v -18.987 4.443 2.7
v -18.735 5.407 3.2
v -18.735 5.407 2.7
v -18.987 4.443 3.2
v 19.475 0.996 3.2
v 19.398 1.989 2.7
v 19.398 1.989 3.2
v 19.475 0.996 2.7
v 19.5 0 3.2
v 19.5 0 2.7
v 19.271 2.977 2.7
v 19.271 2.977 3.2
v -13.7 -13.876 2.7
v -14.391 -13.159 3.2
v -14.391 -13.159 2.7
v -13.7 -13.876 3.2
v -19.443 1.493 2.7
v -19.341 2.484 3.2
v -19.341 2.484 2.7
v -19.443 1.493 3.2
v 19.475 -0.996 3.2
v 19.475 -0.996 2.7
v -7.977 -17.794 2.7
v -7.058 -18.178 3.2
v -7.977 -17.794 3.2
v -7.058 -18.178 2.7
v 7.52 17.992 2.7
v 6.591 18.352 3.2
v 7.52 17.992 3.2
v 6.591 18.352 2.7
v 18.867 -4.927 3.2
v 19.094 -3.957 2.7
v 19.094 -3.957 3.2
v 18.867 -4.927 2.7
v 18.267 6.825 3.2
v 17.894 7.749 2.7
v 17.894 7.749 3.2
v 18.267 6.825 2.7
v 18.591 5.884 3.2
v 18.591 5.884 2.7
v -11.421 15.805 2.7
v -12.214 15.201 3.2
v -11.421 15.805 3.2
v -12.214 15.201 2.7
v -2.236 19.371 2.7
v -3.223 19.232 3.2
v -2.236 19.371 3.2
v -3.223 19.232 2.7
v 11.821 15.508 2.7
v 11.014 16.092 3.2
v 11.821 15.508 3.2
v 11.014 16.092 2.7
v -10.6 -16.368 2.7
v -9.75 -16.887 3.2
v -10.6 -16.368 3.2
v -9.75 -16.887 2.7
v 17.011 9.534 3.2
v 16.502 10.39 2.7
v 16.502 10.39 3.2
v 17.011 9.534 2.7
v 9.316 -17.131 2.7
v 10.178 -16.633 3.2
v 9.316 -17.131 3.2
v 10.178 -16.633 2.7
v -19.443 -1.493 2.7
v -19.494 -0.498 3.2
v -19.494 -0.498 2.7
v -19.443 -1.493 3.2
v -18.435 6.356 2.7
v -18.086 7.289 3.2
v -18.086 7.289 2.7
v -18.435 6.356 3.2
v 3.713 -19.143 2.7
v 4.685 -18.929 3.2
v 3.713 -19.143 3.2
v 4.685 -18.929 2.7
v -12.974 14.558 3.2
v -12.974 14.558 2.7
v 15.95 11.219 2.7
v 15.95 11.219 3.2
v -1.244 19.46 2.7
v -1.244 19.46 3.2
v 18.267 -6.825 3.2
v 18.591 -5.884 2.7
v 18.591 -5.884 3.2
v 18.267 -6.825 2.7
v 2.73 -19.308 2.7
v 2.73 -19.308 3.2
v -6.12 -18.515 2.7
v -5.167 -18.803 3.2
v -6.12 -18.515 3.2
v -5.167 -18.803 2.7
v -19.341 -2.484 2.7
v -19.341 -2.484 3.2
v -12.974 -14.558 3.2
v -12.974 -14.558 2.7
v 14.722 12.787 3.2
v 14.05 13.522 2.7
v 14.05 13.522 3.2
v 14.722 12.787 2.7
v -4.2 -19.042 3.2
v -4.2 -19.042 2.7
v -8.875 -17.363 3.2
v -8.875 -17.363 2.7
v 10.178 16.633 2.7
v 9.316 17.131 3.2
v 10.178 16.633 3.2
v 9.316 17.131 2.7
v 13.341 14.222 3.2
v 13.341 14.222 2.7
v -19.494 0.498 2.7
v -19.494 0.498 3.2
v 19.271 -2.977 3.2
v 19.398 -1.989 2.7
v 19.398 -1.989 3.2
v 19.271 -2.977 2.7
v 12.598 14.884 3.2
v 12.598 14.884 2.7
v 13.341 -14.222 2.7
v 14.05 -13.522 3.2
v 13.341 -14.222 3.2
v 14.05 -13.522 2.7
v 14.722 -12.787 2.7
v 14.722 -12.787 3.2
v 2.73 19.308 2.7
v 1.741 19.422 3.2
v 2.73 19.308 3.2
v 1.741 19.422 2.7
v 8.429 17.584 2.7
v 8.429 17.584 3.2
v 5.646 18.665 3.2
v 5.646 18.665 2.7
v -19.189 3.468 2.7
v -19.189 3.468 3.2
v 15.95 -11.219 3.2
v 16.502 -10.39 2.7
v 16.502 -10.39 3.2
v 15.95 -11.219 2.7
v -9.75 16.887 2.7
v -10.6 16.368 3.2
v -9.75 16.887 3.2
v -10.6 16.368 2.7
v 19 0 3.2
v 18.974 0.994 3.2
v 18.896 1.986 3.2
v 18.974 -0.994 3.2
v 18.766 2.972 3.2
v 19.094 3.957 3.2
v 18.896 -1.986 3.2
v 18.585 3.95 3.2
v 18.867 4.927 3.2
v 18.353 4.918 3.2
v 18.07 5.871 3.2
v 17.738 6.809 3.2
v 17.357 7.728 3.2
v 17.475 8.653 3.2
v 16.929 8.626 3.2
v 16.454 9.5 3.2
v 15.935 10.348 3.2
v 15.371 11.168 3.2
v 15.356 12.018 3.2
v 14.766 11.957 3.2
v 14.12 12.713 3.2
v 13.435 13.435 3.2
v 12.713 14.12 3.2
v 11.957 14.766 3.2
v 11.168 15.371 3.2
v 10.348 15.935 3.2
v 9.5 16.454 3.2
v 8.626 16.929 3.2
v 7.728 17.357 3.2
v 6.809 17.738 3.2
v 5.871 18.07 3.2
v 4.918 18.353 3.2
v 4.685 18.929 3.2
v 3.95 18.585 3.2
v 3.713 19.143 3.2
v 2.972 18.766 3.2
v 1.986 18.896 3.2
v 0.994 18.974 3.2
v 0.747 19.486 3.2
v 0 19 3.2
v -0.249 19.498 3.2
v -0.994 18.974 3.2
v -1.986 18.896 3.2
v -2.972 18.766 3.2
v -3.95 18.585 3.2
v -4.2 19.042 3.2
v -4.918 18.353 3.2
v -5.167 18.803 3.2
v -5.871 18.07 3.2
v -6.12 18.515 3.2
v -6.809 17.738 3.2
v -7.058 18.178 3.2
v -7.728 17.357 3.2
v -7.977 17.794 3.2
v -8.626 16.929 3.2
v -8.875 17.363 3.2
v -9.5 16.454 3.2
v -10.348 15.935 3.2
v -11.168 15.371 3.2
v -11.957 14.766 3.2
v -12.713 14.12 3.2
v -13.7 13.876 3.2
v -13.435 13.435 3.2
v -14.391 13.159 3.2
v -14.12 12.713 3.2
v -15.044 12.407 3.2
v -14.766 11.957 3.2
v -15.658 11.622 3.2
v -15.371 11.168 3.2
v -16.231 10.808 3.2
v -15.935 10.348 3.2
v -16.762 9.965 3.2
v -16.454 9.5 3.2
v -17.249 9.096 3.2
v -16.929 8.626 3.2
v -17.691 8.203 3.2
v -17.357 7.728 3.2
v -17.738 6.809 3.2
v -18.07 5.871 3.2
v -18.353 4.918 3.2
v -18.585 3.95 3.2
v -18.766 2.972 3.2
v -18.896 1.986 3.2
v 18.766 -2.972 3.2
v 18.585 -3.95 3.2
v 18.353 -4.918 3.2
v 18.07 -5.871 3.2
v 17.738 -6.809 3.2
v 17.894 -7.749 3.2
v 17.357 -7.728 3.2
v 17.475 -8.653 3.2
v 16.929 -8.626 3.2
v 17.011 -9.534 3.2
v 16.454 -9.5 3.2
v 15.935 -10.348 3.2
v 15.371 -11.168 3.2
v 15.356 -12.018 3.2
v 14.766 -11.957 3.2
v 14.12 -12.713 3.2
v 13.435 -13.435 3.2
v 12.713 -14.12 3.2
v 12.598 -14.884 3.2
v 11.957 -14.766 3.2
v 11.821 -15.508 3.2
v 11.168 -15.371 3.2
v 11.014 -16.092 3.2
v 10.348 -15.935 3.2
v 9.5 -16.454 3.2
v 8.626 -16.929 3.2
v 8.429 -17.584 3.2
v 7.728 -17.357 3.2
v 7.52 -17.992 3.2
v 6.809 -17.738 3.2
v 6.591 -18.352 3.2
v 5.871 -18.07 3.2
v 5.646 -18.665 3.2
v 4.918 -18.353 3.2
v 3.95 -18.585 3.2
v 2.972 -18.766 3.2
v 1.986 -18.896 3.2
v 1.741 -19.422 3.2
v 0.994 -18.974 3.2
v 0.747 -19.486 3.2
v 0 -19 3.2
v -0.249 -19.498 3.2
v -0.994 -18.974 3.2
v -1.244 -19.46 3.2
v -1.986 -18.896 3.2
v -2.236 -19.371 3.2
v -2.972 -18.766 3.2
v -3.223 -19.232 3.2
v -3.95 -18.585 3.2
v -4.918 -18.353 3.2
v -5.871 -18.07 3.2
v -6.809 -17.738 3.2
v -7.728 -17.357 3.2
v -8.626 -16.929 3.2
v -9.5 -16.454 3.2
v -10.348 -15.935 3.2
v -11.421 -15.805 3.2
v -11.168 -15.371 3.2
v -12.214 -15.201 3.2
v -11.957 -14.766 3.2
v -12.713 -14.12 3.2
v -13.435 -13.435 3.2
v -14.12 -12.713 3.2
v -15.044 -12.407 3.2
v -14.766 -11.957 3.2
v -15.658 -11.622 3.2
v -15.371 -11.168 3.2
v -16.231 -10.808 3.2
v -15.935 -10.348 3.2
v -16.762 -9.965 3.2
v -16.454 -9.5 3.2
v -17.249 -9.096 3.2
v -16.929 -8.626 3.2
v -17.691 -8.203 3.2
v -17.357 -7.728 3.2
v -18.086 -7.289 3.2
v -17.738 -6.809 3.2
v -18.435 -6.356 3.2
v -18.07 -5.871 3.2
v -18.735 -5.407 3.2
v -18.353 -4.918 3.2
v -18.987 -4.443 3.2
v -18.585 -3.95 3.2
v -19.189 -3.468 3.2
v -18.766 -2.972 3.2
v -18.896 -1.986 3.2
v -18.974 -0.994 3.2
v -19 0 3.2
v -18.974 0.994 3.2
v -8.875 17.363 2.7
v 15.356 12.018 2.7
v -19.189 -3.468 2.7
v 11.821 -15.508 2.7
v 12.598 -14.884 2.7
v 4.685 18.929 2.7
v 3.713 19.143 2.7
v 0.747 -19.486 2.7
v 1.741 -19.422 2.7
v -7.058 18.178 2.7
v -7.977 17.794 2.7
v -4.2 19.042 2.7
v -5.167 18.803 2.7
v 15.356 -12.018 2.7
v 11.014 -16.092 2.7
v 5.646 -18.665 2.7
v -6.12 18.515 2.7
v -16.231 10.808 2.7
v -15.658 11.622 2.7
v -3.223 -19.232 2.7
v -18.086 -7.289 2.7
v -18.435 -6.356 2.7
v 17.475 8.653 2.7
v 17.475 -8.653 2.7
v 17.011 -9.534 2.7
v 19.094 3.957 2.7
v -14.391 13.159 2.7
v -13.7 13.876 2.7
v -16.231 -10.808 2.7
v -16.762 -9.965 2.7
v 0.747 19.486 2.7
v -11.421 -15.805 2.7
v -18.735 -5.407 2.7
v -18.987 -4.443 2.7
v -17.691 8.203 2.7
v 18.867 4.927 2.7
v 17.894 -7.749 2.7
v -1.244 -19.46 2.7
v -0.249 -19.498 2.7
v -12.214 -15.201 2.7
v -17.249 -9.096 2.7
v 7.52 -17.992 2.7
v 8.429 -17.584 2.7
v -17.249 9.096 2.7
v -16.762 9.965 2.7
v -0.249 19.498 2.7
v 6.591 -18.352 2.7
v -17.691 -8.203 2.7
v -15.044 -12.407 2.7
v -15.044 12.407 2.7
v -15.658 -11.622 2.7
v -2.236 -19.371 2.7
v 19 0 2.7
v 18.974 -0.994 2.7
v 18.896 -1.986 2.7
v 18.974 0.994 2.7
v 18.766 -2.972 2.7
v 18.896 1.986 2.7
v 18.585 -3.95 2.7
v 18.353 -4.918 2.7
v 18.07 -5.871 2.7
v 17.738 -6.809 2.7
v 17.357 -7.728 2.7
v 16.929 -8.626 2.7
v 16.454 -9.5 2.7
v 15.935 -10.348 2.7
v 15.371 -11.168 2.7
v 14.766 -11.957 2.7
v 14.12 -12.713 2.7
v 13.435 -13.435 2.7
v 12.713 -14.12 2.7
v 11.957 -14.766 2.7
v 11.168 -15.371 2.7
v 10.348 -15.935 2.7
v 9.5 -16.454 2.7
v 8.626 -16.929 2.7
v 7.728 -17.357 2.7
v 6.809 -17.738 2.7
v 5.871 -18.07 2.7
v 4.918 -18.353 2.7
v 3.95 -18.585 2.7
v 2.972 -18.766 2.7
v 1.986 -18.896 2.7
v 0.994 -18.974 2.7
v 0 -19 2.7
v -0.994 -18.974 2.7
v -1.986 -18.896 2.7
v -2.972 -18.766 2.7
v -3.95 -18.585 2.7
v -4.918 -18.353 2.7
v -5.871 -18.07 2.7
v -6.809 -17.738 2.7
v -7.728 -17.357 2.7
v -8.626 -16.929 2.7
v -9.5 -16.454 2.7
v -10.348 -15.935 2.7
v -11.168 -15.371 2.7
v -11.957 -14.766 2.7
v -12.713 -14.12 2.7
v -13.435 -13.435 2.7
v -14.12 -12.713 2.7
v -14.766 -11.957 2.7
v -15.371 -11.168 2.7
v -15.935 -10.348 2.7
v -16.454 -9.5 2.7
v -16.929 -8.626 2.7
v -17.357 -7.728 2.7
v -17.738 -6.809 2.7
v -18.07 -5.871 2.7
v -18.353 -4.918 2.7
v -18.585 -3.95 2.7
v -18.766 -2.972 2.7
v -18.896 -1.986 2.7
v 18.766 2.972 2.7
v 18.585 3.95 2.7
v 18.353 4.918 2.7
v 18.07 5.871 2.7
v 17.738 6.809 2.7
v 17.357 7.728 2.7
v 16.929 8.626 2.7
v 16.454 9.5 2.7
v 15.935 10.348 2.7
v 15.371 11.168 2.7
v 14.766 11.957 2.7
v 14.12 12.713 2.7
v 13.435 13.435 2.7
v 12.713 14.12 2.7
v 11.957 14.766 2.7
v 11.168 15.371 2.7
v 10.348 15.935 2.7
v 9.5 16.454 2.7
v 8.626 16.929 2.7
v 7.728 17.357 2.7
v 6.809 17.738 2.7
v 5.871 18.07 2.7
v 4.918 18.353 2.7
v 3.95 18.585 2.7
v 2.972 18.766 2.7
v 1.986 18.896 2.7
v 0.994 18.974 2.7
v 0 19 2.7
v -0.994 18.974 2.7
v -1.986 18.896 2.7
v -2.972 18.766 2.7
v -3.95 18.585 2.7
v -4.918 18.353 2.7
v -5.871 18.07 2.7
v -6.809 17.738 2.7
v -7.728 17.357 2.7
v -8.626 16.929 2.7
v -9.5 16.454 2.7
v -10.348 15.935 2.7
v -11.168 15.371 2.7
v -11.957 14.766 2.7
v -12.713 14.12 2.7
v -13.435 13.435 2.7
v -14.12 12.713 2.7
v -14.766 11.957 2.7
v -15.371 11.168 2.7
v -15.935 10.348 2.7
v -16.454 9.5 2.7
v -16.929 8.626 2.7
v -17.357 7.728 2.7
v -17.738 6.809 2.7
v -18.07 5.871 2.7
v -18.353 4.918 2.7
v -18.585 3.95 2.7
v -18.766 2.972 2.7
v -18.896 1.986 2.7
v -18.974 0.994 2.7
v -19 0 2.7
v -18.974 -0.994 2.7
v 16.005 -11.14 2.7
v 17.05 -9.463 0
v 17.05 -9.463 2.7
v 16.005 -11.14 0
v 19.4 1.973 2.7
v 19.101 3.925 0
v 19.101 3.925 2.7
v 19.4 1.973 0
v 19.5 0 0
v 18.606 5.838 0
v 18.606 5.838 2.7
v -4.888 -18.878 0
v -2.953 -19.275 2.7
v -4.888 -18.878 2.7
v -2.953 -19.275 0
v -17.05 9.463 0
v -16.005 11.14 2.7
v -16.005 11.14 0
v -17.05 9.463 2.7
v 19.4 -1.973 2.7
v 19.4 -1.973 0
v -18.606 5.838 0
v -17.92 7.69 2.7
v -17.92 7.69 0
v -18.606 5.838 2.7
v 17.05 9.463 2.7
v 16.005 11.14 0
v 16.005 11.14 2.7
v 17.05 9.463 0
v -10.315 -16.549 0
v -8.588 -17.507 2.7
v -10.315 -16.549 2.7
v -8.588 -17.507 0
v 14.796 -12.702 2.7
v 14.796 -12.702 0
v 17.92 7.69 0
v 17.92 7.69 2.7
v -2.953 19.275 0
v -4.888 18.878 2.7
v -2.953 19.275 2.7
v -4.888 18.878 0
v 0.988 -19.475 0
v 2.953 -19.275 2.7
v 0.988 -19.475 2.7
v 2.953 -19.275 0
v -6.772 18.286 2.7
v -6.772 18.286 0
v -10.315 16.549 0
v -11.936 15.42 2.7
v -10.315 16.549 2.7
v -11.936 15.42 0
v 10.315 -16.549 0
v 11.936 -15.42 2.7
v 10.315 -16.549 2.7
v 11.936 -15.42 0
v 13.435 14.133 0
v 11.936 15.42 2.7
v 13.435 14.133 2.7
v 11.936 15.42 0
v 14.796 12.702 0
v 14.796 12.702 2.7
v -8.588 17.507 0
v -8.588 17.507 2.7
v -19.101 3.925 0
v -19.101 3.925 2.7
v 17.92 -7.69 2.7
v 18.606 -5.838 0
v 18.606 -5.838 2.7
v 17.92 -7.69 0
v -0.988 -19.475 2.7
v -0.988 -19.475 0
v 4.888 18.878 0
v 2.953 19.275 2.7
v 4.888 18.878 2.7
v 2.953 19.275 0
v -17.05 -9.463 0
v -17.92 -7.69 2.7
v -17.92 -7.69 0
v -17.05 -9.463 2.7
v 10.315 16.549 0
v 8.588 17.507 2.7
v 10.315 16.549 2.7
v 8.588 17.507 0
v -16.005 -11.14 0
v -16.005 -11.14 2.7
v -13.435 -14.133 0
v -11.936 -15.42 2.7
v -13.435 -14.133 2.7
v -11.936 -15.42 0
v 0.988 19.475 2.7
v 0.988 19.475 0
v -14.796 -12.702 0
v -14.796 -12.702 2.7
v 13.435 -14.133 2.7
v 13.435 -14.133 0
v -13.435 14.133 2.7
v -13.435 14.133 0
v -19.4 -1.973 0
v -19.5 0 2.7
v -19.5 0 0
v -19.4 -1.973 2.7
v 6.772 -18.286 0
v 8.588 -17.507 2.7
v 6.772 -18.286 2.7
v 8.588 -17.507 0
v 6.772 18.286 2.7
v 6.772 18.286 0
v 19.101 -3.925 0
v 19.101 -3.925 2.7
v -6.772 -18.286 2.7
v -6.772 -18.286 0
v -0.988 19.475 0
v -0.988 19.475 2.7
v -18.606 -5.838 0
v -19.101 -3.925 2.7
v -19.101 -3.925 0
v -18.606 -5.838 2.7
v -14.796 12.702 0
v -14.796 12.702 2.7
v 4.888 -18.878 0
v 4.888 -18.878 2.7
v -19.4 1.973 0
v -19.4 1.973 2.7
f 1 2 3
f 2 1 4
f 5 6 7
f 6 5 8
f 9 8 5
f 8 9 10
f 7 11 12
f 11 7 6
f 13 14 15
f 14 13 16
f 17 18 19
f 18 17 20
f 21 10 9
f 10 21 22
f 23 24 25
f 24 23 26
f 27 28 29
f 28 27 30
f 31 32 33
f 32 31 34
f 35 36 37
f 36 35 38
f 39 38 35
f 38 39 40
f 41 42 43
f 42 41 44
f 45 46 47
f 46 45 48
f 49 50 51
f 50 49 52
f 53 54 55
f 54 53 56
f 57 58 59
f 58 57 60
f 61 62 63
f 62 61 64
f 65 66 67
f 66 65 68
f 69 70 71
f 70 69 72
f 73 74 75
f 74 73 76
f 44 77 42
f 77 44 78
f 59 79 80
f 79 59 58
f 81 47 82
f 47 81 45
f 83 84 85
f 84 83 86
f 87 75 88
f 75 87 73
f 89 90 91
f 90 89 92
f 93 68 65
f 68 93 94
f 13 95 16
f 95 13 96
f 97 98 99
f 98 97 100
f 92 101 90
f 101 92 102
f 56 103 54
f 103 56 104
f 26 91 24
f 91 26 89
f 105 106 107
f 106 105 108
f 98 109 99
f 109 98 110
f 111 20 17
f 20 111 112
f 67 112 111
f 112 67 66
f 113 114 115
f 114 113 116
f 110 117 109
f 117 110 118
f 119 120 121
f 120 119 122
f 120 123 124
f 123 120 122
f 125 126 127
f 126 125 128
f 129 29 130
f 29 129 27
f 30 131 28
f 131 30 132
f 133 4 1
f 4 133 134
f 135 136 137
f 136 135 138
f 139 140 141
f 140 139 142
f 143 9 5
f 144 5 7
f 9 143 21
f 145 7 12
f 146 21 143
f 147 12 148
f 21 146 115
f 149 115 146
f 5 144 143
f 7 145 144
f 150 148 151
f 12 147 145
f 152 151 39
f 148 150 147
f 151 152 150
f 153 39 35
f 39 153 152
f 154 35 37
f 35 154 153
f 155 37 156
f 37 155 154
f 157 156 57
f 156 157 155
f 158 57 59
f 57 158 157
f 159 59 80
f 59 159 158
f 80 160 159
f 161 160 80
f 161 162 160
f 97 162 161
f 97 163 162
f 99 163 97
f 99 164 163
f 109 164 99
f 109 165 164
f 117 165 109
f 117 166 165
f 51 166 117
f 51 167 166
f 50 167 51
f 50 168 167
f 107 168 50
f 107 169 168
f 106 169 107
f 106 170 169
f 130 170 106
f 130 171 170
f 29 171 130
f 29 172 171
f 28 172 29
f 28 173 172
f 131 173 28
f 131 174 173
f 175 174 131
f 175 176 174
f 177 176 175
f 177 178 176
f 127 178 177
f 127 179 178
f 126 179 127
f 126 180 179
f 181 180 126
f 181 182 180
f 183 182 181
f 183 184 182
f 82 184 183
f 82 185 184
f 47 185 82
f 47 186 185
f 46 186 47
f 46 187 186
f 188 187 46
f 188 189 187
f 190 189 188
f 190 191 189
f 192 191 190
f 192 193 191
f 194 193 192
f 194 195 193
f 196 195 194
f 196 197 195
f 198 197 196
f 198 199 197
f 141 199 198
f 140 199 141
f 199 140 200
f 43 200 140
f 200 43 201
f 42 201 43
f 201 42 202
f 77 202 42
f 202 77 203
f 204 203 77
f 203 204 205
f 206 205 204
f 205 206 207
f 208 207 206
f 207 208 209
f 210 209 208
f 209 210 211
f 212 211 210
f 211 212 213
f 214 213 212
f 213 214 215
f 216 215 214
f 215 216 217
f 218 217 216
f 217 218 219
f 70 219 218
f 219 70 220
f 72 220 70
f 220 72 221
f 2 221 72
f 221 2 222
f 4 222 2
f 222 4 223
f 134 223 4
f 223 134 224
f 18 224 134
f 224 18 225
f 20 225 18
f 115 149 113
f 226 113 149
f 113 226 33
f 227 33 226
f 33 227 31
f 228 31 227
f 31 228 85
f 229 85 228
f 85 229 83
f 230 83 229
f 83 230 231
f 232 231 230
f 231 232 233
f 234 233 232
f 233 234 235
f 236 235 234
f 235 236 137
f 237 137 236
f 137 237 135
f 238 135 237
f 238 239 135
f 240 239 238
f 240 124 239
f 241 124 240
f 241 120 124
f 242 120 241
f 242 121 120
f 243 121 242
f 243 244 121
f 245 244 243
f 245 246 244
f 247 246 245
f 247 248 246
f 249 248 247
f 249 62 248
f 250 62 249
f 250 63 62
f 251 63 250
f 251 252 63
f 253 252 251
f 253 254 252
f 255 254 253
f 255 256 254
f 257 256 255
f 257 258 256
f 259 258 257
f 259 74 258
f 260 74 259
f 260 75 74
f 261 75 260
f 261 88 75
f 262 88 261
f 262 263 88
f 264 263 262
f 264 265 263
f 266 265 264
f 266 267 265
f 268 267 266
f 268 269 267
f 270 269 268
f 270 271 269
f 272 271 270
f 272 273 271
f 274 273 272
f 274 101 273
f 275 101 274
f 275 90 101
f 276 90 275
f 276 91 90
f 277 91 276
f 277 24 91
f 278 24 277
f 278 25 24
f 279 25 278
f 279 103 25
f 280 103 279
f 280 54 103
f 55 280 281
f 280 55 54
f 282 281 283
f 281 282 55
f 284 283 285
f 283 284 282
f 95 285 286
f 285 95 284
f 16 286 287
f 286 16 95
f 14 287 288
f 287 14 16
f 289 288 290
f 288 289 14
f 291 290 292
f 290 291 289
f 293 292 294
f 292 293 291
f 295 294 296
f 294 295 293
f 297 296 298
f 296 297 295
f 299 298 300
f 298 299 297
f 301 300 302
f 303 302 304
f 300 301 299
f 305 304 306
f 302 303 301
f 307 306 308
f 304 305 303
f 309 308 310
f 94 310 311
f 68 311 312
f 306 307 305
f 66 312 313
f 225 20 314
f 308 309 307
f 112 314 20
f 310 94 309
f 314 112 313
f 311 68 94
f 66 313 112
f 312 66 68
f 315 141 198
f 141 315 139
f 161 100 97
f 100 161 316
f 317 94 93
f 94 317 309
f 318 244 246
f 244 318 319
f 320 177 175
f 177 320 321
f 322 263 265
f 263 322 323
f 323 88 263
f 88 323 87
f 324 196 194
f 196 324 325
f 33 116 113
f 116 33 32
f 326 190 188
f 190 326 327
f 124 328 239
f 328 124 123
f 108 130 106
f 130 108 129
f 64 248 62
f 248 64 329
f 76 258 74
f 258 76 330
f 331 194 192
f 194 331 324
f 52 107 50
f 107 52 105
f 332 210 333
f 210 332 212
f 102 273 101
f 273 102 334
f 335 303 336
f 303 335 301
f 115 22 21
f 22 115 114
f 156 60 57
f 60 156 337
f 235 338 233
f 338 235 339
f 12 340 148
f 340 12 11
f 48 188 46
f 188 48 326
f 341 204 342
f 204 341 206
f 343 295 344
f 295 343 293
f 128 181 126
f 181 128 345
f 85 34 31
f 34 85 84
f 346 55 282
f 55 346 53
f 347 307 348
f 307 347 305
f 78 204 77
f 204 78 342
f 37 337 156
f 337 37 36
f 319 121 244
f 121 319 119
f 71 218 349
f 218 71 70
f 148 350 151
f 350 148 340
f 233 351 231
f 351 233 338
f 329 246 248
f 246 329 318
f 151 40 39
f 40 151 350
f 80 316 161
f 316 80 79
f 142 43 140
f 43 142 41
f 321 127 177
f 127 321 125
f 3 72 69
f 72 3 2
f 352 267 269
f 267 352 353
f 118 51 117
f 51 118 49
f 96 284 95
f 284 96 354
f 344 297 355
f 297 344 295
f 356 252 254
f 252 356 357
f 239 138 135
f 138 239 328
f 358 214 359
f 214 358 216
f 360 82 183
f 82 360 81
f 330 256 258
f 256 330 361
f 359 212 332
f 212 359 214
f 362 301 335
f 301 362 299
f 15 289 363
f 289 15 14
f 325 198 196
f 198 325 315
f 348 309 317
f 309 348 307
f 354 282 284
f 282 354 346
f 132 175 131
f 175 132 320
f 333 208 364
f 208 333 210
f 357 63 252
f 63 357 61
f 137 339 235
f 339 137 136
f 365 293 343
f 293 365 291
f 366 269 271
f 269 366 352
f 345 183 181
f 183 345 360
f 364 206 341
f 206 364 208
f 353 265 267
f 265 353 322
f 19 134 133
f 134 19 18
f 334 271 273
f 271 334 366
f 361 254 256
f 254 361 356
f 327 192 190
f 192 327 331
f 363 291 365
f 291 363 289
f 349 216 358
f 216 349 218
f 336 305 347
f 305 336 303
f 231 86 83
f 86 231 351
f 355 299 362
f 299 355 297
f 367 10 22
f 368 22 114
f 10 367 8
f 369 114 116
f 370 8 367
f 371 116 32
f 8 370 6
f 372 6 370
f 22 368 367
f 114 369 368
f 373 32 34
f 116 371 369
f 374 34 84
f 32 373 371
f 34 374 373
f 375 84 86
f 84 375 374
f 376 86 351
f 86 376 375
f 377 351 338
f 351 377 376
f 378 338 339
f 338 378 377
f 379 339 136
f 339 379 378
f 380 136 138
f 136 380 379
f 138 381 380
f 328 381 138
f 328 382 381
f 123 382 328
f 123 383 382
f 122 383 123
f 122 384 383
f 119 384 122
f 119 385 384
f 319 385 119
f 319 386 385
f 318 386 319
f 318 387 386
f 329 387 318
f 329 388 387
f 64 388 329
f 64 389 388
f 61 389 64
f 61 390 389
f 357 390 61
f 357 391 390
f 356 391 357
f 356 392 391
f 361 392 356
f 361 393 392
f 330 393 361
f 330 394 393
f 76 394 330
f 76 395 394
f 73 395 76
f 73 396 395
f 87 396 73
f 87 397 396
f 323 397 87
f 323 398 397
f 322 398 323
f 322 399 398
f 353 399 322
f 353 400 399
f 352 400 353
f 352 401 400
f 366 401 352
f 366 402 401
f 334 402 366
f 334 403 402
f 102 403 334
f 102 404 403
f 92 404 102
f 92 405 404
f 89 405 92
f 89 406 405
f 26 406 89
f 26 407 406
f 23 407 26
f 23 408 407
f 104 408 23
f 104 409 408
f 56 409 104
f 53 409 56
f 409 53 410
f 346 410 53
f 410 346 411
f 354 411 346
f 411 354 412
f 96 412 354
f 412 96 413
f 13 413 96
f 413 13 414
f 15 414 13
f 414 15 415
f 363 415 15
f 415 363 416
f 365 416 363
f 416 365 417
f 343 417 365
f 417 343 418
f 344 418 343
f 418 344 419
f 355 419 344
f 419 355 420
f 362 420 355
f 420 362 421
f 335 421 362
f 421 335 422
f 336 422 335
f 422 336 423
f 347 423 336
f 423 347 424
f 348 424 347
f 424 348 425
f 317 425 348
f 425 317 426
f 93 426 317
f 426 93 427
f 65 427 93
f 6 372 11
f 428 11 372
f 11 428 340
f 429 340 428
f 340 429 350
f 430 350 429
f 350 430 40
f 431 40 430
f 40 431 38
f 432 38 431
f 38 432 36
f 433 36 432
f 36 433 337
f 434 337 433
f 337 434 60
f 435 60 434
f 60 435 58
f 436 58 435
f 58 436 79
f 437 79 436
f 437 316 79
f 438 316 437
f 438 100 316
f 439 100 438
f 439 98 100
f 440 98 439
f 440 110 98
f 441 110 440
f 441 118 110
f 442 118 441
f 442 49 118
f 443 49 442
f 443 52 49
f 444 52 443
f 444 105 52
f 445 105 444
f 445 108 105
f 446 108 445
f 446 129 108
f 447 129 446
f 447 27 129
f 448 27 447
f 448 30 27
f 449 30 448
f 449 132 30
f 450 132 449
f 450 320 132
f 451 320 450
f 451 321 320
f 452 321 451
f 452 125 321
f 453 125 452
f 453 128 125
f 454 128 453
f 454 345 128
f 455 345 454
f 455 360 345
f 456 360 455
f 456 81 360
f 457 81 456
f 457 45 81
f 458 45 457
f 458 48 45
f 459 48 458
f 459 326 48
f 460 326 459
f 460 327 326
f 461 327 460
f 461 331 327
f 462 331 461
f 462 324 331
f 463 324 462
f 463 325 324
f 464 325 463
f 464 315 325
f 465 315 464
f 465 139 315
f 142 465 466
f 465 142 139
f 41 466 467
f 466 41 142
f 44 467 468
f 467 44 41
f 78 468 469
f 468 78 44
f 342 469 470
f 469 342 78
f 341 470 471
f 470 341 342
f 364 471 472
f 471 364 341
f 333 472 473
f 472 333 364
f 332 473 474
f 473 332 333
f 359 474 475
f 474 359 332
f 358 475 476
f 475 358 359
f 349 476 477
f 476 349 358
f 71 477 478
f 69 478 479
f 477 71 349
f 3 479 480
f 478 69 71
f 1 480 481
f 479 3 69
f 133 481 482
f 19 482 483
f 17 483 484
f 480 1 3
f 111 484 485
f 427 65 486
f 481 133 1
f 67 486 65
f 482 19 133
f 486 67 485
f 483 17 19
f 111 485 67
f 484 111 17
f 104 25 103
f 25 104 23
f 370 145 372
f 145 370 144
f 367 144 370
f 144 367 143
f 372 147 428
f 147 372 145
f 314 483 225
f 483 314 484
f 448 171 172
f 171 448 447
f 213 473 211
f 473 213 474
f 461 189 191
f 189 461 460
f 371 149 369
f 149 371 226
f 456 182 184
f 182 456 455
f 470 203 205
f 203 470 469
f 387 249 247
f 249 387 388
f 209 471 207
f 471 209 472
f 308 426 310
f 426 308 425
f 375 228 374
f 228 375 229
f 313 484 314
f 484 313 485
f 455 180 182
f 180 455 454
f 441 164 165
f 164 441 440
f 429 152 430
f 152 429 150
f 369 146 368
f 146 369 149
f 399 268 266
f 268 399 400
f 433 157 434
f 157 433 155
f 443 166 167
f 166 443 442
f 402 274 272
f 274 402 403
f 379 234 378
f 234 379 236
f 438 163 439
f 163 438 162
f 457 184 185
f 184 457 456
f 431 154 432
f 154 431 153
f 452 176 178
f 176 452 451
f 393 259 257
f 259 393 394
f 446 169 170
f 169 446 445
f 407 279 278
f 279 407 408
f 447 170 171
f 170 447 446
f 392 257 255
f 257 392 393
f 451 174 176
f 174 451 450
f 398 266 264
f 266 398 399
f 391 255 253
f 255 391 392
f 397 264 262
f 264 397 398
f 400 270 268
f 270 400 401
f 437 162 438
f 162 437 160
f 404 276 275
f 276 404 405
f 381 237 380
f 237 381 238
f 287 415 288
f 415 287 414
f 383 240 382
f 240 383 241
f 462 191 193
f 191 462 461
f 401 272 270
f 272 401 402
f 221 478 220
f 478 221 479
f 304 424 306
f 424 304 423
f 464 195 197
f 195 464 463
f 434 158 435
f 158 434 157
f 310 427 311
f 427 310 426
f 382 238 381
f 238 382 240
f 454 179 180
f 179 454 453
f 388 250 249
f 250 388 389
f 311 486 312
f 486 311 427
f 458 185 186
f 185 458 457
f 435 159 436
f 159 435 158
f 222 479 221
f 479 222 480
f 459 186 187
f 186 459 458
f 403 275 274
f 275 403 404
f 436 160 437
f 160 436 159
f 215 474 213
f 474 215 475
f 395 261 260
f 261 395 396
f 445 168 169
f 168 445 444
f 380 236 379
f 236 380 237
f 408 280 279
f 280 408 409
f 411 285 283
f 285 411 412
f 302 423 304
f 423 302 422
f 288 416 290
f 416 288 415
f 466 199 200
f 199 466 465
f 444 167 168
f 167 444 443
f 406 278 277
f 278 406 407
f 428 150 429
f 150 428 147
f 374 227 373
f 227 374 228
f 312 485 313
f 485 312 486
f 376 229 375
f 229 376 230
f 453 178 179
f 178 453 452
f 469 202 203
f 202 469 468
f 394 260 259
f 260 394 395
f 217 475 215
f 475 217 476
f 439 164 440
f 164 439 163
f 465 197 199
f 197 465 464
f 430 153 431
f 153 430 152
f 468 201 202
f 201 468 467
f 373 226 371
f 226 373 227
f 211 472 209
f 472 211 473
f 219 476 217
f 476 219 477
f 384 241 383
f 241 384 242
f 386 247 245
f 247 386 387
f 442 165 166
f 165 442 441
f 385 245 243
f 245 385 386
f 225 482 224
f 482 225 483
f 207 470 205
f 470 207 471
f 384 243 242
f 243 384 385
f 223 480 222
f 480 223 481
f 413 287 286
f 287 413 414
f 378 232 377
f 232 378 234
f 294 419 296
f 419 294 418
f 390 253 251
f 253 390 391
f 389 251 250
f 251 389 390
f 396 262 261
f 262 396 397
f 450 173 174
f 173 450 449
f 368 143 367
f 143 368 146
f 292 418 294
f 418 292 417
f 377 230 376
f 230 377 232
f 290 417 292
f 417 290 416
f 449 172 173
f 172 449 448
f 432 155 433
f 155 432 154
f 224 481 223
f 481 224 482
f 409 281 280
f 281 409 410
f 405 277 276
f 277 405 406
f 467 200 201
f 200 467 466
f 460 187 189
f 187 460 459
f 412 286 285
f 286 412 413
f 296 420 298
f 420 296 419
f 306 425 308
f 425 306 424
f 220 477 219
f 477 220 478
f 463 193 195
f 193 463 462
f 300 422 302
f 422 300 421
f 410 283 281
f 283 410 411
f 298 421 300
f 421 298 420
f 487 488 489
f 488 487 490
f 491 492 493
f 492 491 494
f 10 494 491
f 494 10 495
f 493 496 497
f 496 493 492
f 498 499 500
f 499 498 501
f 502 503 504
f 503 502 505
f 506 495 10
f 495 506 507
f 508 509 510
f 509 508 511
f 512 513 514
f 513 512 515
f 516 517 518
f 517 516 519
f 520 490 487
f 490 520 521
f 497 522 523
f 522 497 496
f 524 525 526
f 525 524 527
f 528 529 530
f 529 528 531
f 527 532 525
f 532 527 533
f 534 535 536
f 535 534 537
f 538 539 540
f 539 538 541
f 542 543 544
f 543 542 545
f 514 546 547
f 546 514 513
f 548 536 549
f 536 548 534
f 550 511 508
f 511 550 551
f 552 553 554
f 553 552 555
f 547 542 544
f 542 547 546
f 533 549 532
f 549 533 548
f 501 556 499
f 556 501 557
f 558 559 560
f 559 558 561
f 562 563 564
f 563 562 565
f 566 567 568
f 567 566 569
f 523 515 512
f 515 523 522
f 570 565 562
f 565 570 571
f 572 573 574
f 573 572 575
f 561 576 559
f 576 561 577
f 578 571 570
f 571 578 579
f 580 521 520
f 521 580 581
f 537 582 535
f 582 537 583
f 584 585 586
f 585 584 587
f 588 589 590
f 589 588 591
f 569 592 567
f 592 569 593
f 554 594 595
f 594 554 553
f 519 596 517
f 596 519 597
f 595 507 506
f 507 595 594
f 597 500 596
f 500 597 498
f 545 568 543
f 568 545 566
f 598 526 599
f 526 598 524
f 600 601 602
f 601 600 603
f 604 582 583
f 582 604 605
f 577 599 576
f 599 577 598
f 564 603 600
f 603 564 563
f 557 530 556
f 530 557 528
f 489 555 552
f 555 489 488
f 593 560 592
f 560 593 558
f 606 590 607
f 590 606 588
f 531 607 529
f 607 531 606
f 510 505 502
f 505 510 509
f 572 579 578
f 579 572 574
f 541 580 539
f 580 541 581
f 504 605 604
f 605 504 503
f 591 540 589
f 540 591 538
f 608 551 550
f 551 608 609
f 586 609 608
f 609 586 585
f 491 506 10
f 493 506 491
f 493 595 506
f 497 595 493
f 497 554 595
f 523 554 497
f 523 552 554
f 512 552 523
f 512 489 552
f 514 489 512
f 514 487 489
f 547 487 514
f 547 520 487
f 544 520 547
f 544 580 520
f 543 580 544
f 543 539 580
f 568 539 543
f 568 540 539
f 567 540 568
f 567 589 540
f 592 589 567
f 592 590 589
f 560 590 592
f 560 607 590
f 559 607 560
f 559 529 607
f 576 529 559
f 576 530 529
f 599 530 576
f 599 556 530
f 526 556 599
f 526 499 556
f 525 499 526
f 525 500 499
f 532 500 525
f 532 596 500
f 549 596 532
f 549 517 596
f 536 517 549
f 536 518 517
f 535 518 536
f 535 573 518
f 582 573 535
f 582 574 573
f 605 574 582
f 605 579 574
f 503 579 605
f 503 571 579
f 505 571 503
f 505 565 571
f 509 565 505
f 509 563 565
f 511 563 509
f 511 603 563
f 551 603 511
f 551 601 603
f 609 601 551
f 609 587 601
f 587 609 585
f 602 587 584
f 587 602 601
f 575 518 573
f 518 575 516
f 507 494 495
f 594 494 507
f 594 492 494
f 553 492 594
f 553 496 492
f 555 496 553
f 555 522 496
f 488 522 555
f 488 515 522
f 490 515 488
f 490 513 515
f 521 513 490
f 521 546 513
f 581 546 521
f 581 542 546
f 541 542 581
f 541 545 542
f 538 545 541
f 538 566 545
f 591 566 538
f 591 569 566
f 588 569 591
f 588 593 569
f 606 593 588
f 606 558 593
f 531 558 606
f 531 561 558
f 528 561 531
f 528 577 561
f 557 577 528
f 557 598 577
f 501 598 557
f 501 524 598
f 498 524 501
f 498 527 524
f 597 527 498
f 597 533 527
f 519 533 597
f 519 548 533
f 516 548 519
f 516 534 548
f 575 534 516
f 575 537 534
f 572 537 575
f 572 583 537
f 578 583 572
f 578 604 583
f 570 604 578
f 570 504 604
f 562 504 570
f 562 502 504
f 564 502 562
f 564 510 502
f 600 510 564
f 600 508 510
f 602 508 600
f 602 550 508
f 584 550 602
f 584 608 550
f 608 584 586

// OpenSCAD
// file: coin.scad
// Challenge coin generator.
// All dimensions in millimeters.

use <write.scad>

// Epsilon
E = 0.01;


module coin(
    top_text="",        // Text of centered top text
    bottom_text="",     // Text of centered bottom text
    rev_top_text="",    // Reverse top text
    rev_bottom_text="", // Reverse bottom text
    size=39,            // Diameter of coin
    thickness=3.2,      // Total coin thickness
    relief=0.5,         // Height of raised (relief) features
    text_height=5.0,    // Height of a text letter
    spacing=1.0,        // 1.0 == nominal spacing (ratio)
    rim_width=0.5       // Rim edge thickness
    ) {
  difference() {
    union() {
      cylinder(r=size / 2, h=thickness - relief, $fa=1);
      translate([0, 0, thickness - relief])
        face(top_text, bottom_text, size, relief, text_height, spacing, rim_width);
      }
    translate([0, 0, relief])
      rotate(a=180, v=[1, 0, 0])
      face(rev_top_text, rev_bottom_text, size, relief + E, text_height, spacing, rim_width,
           rim=false);
  }
}

module face(
    top_text="",      // Text of centered top text
    bottom_text="",   // Text of centered bottom text
    size=39,          // Diameter of coin
    relief=0.5,       // Height of raised (relief) features
    text_height=5.0,  // Height of a text letter
    spacing=1.0,      // 1.0 == nominal spacing (ratio)
    rim_width=0.5,    // Rim edge thickness
    rim=true,         // Boolean control drawing rim ridge
    image_file=""     // Optional face image (DXF file)
    ) {
  if (rim) {
    ring(r=size / 2, thickness=rim_width, height=relief);
  }
  arc_text(top_text, size / 2 - rim_width * 4, text_height, relief, spacing, true);
  arc_text(bottom_text, size / 2 - rim_width * 4, text_height, relief, spacing, false);
  if (image_file != "") {
    linear_extrude(height=relief, center=true, convexity=10)
      import_dxf(file=image_file, layer="none");
  }
}

module arc_text(
    text,
    r,
    text_height=3.0,
    height=1.0,
    spacing=1.0,
    top=true
    ) {
  ang = spacing * atan2(text_height, r);
  start_ang = (len(text) - 1) / 2 * ang;
  ang_sgn = top ? -1 : 1;
  offset_sgn = top ? 1 : -1;
  for (i = [0 : len(text) - 1]) {
    rotate(a=ang_sgn * (ang * i - start_ang), v=[0, 0, 1])
      translate([0, offset_sgn * (r - text_height / 2), height / 2])
        write(text[i], h=text_height, t=height, center=true, font="Letters.dxf");
  }
}

// Ring around origin (at z=0)
module ring(r, thickness, height) {
  translate([0, 0, height / 2]) {
    difference() {
      cylinder(h=height, r=r, $fa=1, $fs=1, center=true);
      cylinder(h=height + E, r=r - thickness, $fa=1, $fs=1, center=true);
    }
  }
}

coin(top_text="HELLO", bottom_text="World",
     rev_top_text="Oh yeah", rev_bottom_text="I went there");
// main file
use <coin.scad>

coin(top_text="Jury Duty",
     bottom_text="August 2, 2013",
     rev_top_text="King County Superior Court",
     text_height=5.0,
     spacing=0.8);
